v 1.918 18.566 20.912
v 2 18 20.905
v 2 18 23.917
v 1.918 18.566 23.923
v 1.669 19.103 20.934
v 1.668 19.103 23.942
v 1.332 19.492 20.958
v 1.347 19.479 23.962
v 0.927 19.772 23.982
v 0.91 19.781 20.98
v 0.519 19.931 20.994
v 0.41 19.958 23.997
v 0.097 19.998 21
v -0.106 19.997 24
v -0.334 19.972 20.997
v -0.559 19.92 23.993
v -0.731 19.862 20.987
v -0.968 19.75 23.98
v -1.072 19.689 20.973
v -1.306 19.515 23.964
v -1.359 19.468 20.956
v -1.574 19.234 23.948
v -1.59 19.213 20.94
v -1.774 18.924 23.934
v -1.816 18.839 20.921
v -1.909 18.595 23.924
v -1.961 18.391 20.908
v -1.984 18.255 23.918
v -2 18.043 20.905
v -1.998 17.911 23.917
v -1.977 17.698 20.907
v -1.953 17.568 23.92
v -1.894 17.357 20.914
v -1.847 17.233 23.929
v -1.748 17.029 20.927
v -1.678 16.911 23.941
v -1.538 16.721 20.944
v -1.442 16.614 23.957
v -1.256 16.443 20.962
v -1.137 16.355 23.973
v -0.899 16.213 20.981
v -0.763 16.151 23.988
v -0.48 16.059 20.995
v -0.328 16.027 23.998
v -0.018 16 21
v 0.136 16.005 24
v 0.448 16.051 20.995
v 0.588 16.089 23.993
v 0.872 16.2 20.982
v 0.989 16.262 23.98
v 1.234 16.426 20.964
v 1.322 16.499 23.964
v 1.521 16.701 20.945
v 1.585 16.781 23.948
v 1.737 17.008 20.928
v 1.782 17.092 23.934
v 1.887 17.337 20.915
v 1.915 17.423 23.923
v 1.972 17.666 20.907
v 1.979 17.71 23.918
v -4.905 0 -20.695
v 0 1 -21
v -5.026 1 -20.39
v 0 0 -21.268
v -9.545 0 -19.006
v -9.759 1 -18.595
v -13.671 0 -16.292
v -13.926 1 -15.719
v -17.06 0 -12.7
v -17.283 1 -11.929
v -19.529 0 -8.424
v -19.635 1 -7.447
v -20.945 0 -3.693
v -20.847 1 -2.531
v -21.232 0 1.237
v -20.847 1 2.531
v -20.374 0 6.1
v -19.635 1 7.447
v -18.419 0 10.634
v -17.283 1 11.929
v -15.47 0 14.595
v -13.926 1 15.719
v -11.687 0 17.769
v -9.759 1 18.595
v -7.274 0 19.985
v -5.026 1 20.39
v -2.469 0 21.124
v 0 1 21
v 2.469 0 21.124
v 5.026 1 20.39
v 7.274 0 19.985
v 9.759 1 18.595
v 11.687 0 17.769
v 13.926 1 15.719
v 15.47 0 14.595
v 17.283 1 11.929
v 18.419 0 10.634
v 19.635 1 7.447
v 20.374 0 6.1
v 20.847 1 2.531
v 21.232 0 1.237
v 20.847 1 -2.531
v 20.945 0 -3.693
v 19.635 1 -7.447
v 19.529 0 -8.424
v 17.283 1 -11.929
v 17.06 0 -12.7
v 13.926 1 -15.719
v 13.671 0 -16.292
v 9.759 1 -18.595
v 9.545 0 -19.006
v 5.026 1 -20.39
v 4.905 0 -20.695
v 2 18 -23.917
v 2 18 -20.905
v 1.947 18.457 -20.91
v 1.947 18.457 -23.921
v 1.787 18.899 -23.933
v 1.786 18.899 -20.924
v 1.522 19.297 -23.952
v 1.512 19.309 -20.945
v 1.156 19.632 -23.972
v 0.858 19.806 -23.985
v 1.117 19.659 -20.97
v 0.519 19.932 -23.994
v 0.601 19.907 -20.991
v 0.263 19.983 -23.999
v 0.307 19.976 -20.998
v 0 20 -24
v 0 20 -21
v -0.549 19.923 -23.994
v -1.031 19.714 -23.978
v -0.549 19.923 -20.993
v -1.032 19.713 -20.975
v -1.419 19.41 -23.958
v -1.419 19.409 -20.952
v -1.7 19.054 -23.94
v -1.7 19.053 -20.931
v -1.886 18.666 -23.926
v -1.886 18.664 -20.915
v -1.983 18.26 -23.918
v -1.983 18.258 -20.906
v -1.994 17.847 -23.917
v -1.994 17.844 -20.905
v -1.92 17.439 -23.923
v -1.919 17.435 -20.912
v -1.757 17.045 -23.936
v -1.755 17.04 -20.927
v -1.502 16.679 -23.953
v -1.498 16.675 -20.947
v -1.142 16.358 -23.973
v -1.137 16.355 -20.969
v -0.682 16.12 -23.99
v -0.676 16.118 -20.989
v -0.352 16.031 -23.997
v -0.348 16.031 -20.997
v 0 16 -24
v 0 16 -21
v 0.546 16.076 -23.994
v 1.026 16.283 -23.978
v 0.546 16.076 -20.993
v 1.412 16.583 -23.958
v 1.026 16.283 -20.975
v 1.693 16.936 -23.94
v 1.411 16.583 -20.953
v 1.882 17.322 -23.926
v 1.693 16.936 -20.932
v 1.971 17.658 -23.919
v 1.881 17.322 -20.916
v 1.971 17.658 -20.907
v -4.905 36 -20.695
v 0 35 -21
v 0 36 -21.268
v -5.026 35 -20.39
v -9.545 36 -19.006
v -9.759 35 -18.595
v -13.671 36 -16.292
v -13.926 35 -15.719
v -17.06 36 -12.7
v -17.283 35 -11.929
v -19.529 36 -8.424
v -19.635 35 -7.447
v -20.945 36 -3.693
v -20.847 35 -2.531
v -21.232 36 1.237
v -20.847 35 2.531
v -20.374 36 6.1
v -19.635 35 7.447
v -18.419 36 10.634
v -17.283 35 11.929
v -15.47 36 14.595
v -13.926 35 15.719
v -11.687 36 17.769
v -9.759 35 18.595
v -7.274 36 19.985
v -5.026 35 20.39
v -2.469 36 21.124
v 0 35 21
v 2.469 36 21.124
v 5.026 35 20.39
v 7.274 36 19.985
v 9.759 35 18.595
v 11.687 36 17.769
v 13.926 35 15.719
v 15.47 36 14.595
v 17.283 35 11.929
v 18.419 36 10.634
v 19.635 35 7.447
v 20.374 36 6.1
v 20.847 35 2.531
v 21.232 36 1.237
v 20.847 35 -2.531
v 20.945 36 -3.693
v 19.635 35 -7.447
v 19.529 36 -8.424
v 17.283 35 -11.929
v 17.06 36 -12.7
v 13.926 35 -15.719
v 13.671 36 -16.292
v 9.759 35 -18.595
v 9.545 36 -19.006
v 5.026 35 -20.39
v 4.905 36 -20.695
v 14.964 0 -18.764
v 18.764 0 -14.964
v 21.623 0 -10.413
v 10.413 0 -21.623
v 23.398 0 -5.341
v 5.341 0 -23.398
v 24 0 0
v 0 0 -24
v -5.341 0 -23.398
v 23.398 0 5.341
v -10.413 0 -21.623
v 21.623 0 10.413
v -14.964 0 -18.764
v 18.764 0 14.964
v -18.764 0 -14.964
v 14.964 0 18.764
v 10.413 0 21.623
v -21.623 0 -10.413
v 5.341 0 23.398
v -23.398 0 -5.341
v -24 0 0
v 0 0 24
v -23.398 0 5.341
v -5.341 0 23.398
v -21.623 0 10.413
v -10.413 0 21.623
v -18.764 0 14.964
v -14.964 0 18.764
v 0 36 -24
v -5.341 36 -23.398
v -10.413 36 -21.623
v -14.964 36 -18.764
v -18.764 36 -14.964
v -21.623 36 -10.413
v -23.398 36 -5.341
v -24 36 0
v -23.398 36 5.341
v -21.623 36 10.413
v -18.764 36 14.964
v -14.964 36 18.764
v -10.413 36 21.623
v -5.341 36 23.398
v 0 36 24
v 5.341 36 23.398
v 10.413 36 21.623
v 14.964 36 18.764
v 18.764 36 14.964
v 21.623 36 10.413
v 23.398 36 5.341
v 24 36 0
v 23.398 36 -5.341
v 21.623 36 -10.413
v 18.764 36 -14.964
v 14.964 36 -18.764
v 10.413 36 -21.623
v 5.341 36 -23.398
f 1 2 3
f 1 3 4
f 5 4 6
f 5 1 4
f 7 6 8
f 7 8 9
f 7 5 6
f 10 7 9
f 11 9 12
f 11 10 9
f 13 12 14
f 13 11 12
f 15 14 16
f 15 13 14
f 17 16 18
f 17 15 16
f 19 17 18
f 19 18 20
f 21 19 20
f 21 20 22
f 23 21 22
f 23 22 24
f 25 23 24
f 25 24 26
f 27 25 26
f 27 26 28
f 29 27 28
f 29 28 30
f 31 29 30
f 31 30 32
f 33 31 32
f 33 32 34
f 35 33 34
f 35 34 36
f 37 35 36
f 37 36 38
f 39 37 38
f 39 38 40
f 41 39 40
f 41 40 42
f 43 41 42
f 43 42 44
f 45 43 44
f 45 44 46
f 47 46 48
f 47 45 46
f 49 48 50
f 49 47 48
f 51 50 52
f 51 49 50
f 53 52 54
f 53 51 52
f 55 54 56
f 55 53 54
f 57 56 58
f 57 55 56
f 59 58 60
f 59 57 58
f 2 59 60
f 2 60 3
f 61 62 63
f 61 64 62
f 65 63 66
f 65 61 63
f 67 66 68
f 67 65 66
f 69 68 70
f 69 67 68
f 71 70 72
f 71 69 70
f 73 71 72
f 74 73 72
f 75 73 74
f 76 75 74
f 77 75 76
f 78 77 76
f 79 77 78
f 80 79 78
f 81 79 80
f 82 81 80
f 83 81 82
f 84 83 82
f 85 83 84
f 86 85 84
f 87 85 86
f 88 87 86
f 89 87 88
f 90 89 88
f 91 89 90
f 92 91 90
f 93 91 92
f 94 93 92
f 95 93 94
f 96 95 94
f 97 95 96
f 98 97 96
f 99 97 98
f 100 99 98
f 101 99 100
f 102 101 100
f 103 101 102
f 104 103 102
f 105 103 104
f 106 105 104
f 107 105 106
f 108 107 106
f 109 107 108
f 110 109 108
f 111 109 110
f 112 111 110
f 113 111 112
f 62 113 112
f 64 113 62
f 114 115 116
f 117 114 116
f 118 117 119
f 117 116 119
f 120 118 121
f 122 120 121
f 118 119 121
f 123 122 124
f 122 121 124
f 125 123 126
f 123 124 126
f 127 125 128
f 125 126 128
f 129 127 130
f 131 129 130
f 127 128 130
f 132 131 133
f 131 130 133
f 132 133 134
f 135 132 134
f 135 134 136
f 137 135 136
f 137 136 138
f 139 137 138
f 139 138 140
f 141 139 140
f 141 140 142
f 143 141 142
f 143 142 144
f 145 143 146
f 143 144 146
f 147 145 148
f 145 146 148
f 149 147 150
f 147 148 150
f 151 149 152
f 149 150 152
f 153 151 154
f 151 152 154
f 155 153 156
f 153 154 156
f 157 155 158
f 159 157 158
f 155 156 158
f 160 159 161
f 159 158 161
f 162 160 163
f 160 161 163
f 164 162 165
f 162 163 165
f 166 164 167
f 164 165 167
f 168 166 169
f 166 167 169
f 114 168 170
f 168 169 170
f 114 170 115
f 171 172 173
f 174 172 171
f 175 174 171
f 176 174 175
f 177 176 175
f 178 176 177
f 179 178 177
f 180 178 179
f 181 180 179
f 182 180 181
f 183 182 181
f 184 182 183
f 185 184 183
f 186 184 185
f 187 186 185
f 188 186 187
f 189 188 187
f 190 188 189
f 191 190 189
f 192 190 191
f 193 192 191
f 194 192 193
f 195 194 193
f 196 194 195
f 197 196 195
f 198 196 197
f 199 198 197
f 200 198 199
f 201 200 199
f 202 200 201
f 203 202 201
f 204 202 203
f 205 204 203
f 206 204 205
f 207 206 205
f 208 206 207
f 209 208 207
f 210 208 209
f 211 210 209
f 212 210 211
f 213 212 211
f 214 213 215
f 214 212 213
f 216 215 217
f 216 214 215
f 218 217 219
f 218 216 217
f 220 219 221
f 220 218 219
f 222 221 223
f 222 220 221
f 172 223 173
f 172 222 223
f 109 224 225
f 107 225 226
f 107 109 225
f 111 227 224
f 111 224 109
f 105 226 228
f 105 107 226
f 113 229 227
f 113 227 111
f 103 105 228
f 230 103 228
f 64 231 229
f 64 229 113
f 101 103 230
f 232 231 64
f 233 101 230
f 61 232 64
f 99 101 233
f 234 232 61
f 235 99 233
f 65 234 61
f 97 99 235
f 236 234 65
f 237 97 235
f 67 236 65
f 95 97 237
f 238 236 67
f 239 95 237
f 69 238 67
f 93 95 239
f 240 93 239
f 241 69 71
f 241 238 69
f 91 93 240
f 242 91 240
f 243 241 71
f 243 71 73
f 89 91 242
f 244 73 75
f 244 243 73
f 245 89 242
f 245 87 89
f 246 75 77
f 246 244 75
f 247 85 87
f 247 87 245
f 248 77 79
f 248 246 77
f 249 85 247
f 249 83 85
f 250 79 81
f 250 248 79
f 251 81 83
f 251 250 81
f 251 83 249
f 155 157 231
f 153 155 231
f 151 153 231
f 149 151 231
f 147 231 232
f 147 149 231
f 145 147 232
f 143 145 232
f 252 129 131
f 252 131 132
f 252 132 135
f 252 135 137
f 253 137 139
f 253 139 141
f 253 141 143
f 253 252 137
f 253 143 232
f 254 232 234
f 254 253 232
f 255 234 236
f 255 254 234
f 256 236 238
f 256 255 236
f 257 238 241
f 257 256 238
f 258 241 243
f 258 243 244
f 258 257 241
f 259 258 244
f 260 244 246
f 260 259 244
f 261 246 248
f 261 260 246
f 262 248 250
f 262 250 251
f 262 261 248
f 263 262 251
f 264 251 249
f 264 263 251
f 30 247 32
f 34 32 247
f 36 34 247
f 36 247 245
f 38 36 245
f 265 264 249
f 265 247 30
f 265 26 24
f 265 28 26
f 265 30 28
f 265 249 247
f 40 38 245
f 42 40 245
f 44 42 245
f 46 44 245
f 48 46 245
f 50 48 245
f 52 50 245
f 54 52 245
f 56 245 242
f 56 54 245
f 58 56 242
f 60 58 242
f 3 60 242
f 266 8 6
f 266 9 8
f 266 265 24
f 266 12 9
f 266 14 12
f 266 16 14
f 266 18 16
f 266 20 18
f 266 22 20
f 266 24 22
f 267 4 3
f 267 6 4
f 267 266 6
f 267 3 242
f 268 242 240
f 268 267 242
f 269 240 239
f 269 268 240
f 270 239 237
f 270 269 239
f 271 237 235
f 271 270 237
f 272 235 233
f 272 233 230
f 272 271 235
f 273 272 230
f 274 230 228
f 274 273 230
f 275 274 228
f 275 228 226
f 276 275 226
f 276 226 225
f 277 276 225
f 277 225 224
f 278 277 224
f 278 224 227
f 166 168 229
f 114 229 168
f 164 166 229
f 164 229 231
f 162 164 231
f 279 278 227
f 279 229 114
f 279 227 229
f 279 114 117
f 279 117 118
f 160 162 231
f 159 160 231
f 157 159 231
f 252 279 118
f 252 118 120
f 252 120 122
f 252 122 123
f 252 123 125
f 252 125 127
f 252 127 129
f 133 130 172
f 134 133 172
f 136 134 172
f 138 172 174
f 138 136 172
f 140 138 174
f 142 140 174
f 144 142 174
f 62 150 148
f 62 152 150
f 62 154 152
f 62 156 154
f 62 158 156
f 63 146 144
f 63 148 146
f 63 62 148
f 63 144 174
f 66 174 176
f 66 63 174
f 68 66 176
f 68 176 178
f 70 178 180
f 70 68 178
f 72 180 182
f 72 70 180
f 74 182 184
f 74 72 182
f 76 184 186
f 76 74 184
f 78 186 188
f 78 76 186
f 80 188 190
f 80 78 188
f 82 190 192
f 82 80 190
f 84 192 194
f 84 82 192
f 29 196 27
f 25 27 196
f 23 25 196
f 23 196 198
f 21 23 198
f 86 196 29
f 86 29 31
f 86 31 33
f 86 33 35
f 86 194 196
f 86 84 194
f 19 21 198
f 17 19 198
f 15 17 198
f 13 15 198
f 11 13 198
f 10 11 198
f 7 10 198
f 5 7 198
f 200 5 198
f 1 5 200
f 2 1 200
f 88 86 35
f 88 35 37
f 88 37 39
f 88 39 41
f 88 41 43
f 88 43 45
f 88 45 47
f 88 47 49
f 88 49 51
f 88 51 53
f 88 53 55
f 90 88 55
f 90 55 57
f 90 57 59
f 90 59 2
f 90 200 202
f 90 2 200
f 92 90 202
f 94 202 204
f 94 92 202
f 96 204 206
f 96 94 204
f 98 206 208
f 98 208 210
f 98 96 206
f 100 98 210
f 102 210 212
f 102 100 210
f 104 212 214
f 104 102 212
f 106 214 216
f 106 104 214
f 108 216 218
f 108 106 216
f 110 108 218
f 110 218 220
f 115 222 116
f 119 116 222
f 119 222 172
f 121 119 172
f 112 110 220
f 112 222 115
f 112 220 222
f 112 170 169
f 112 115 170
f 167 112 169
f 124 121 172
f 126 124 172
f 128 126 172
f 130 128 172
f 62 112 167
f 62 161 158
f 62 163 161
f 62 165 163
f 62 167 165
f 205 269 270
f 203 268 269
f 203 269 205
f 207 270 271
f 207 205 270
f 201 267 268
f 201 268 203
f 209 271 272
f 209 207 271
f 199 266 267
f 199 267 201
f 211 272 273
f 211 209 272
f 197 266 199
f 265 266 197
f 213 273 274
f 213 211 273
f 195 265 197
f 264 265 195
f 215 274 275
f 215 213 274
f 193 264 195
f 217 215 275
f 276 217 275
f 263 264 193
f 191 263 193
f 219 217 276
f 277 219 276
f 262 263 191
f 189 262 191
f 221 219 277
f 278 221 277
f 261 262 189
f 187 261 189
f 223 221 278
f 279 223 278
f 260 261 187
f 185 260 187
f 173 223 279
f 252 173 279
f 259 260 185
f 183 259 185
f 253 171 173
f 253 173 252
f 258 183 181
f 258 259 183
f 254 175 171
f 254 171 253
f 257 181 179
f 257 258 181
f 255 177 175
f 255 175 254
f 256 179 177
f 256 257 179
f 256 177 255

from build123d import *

# Parameters (mm, degrees)
ESQUISSE2_R                  = 2
ENL_V_MAT_EXTRU_1_DEPTH      = 25
ENL_V_MAT_EXTRU_1_DEPTH_BACK = 25


with BuildPart() as part:
    # Esquisse1 → Révolution1 (revolve)
    with BuildSketch(Plane.XY, mode=Mode.PRIVATE) as r_volution1_sk:
        Polygon((-24, 36), (-21.267949192, 36), (-21, 35), (-21, 1), (-21.267949192, 0), (-24, 0), align=None)
    revolve(r_volution1_sk.sketch.rotate(Axis((0, 0, 0), (0, 1, 0)), 270), axis=Axis((0, 0, 0), (0, 1, 0)))  # turned: the seam where the file's is

    # Esquisse2 → Enlèv. mat.-Extru.1 (cut, two sides)
    with BuildSketch(Plane.XY) as enl_v_mat_extru_1_sk:
        with Locations((0, 18)):
            Circle(ESQUISSE2_R)
    extrude(amount=ENL_V_MAT_EXTRU_1_DEPTH, mode=Mode.SUBTRACT)
    extrude(enl_v_mat_extru_1_sk.sketch, amount=-ENL_V_MAT_EXTRU_1_DEPTH_BACK, mode=Mode.SUBTRACT)


solid = part.part
